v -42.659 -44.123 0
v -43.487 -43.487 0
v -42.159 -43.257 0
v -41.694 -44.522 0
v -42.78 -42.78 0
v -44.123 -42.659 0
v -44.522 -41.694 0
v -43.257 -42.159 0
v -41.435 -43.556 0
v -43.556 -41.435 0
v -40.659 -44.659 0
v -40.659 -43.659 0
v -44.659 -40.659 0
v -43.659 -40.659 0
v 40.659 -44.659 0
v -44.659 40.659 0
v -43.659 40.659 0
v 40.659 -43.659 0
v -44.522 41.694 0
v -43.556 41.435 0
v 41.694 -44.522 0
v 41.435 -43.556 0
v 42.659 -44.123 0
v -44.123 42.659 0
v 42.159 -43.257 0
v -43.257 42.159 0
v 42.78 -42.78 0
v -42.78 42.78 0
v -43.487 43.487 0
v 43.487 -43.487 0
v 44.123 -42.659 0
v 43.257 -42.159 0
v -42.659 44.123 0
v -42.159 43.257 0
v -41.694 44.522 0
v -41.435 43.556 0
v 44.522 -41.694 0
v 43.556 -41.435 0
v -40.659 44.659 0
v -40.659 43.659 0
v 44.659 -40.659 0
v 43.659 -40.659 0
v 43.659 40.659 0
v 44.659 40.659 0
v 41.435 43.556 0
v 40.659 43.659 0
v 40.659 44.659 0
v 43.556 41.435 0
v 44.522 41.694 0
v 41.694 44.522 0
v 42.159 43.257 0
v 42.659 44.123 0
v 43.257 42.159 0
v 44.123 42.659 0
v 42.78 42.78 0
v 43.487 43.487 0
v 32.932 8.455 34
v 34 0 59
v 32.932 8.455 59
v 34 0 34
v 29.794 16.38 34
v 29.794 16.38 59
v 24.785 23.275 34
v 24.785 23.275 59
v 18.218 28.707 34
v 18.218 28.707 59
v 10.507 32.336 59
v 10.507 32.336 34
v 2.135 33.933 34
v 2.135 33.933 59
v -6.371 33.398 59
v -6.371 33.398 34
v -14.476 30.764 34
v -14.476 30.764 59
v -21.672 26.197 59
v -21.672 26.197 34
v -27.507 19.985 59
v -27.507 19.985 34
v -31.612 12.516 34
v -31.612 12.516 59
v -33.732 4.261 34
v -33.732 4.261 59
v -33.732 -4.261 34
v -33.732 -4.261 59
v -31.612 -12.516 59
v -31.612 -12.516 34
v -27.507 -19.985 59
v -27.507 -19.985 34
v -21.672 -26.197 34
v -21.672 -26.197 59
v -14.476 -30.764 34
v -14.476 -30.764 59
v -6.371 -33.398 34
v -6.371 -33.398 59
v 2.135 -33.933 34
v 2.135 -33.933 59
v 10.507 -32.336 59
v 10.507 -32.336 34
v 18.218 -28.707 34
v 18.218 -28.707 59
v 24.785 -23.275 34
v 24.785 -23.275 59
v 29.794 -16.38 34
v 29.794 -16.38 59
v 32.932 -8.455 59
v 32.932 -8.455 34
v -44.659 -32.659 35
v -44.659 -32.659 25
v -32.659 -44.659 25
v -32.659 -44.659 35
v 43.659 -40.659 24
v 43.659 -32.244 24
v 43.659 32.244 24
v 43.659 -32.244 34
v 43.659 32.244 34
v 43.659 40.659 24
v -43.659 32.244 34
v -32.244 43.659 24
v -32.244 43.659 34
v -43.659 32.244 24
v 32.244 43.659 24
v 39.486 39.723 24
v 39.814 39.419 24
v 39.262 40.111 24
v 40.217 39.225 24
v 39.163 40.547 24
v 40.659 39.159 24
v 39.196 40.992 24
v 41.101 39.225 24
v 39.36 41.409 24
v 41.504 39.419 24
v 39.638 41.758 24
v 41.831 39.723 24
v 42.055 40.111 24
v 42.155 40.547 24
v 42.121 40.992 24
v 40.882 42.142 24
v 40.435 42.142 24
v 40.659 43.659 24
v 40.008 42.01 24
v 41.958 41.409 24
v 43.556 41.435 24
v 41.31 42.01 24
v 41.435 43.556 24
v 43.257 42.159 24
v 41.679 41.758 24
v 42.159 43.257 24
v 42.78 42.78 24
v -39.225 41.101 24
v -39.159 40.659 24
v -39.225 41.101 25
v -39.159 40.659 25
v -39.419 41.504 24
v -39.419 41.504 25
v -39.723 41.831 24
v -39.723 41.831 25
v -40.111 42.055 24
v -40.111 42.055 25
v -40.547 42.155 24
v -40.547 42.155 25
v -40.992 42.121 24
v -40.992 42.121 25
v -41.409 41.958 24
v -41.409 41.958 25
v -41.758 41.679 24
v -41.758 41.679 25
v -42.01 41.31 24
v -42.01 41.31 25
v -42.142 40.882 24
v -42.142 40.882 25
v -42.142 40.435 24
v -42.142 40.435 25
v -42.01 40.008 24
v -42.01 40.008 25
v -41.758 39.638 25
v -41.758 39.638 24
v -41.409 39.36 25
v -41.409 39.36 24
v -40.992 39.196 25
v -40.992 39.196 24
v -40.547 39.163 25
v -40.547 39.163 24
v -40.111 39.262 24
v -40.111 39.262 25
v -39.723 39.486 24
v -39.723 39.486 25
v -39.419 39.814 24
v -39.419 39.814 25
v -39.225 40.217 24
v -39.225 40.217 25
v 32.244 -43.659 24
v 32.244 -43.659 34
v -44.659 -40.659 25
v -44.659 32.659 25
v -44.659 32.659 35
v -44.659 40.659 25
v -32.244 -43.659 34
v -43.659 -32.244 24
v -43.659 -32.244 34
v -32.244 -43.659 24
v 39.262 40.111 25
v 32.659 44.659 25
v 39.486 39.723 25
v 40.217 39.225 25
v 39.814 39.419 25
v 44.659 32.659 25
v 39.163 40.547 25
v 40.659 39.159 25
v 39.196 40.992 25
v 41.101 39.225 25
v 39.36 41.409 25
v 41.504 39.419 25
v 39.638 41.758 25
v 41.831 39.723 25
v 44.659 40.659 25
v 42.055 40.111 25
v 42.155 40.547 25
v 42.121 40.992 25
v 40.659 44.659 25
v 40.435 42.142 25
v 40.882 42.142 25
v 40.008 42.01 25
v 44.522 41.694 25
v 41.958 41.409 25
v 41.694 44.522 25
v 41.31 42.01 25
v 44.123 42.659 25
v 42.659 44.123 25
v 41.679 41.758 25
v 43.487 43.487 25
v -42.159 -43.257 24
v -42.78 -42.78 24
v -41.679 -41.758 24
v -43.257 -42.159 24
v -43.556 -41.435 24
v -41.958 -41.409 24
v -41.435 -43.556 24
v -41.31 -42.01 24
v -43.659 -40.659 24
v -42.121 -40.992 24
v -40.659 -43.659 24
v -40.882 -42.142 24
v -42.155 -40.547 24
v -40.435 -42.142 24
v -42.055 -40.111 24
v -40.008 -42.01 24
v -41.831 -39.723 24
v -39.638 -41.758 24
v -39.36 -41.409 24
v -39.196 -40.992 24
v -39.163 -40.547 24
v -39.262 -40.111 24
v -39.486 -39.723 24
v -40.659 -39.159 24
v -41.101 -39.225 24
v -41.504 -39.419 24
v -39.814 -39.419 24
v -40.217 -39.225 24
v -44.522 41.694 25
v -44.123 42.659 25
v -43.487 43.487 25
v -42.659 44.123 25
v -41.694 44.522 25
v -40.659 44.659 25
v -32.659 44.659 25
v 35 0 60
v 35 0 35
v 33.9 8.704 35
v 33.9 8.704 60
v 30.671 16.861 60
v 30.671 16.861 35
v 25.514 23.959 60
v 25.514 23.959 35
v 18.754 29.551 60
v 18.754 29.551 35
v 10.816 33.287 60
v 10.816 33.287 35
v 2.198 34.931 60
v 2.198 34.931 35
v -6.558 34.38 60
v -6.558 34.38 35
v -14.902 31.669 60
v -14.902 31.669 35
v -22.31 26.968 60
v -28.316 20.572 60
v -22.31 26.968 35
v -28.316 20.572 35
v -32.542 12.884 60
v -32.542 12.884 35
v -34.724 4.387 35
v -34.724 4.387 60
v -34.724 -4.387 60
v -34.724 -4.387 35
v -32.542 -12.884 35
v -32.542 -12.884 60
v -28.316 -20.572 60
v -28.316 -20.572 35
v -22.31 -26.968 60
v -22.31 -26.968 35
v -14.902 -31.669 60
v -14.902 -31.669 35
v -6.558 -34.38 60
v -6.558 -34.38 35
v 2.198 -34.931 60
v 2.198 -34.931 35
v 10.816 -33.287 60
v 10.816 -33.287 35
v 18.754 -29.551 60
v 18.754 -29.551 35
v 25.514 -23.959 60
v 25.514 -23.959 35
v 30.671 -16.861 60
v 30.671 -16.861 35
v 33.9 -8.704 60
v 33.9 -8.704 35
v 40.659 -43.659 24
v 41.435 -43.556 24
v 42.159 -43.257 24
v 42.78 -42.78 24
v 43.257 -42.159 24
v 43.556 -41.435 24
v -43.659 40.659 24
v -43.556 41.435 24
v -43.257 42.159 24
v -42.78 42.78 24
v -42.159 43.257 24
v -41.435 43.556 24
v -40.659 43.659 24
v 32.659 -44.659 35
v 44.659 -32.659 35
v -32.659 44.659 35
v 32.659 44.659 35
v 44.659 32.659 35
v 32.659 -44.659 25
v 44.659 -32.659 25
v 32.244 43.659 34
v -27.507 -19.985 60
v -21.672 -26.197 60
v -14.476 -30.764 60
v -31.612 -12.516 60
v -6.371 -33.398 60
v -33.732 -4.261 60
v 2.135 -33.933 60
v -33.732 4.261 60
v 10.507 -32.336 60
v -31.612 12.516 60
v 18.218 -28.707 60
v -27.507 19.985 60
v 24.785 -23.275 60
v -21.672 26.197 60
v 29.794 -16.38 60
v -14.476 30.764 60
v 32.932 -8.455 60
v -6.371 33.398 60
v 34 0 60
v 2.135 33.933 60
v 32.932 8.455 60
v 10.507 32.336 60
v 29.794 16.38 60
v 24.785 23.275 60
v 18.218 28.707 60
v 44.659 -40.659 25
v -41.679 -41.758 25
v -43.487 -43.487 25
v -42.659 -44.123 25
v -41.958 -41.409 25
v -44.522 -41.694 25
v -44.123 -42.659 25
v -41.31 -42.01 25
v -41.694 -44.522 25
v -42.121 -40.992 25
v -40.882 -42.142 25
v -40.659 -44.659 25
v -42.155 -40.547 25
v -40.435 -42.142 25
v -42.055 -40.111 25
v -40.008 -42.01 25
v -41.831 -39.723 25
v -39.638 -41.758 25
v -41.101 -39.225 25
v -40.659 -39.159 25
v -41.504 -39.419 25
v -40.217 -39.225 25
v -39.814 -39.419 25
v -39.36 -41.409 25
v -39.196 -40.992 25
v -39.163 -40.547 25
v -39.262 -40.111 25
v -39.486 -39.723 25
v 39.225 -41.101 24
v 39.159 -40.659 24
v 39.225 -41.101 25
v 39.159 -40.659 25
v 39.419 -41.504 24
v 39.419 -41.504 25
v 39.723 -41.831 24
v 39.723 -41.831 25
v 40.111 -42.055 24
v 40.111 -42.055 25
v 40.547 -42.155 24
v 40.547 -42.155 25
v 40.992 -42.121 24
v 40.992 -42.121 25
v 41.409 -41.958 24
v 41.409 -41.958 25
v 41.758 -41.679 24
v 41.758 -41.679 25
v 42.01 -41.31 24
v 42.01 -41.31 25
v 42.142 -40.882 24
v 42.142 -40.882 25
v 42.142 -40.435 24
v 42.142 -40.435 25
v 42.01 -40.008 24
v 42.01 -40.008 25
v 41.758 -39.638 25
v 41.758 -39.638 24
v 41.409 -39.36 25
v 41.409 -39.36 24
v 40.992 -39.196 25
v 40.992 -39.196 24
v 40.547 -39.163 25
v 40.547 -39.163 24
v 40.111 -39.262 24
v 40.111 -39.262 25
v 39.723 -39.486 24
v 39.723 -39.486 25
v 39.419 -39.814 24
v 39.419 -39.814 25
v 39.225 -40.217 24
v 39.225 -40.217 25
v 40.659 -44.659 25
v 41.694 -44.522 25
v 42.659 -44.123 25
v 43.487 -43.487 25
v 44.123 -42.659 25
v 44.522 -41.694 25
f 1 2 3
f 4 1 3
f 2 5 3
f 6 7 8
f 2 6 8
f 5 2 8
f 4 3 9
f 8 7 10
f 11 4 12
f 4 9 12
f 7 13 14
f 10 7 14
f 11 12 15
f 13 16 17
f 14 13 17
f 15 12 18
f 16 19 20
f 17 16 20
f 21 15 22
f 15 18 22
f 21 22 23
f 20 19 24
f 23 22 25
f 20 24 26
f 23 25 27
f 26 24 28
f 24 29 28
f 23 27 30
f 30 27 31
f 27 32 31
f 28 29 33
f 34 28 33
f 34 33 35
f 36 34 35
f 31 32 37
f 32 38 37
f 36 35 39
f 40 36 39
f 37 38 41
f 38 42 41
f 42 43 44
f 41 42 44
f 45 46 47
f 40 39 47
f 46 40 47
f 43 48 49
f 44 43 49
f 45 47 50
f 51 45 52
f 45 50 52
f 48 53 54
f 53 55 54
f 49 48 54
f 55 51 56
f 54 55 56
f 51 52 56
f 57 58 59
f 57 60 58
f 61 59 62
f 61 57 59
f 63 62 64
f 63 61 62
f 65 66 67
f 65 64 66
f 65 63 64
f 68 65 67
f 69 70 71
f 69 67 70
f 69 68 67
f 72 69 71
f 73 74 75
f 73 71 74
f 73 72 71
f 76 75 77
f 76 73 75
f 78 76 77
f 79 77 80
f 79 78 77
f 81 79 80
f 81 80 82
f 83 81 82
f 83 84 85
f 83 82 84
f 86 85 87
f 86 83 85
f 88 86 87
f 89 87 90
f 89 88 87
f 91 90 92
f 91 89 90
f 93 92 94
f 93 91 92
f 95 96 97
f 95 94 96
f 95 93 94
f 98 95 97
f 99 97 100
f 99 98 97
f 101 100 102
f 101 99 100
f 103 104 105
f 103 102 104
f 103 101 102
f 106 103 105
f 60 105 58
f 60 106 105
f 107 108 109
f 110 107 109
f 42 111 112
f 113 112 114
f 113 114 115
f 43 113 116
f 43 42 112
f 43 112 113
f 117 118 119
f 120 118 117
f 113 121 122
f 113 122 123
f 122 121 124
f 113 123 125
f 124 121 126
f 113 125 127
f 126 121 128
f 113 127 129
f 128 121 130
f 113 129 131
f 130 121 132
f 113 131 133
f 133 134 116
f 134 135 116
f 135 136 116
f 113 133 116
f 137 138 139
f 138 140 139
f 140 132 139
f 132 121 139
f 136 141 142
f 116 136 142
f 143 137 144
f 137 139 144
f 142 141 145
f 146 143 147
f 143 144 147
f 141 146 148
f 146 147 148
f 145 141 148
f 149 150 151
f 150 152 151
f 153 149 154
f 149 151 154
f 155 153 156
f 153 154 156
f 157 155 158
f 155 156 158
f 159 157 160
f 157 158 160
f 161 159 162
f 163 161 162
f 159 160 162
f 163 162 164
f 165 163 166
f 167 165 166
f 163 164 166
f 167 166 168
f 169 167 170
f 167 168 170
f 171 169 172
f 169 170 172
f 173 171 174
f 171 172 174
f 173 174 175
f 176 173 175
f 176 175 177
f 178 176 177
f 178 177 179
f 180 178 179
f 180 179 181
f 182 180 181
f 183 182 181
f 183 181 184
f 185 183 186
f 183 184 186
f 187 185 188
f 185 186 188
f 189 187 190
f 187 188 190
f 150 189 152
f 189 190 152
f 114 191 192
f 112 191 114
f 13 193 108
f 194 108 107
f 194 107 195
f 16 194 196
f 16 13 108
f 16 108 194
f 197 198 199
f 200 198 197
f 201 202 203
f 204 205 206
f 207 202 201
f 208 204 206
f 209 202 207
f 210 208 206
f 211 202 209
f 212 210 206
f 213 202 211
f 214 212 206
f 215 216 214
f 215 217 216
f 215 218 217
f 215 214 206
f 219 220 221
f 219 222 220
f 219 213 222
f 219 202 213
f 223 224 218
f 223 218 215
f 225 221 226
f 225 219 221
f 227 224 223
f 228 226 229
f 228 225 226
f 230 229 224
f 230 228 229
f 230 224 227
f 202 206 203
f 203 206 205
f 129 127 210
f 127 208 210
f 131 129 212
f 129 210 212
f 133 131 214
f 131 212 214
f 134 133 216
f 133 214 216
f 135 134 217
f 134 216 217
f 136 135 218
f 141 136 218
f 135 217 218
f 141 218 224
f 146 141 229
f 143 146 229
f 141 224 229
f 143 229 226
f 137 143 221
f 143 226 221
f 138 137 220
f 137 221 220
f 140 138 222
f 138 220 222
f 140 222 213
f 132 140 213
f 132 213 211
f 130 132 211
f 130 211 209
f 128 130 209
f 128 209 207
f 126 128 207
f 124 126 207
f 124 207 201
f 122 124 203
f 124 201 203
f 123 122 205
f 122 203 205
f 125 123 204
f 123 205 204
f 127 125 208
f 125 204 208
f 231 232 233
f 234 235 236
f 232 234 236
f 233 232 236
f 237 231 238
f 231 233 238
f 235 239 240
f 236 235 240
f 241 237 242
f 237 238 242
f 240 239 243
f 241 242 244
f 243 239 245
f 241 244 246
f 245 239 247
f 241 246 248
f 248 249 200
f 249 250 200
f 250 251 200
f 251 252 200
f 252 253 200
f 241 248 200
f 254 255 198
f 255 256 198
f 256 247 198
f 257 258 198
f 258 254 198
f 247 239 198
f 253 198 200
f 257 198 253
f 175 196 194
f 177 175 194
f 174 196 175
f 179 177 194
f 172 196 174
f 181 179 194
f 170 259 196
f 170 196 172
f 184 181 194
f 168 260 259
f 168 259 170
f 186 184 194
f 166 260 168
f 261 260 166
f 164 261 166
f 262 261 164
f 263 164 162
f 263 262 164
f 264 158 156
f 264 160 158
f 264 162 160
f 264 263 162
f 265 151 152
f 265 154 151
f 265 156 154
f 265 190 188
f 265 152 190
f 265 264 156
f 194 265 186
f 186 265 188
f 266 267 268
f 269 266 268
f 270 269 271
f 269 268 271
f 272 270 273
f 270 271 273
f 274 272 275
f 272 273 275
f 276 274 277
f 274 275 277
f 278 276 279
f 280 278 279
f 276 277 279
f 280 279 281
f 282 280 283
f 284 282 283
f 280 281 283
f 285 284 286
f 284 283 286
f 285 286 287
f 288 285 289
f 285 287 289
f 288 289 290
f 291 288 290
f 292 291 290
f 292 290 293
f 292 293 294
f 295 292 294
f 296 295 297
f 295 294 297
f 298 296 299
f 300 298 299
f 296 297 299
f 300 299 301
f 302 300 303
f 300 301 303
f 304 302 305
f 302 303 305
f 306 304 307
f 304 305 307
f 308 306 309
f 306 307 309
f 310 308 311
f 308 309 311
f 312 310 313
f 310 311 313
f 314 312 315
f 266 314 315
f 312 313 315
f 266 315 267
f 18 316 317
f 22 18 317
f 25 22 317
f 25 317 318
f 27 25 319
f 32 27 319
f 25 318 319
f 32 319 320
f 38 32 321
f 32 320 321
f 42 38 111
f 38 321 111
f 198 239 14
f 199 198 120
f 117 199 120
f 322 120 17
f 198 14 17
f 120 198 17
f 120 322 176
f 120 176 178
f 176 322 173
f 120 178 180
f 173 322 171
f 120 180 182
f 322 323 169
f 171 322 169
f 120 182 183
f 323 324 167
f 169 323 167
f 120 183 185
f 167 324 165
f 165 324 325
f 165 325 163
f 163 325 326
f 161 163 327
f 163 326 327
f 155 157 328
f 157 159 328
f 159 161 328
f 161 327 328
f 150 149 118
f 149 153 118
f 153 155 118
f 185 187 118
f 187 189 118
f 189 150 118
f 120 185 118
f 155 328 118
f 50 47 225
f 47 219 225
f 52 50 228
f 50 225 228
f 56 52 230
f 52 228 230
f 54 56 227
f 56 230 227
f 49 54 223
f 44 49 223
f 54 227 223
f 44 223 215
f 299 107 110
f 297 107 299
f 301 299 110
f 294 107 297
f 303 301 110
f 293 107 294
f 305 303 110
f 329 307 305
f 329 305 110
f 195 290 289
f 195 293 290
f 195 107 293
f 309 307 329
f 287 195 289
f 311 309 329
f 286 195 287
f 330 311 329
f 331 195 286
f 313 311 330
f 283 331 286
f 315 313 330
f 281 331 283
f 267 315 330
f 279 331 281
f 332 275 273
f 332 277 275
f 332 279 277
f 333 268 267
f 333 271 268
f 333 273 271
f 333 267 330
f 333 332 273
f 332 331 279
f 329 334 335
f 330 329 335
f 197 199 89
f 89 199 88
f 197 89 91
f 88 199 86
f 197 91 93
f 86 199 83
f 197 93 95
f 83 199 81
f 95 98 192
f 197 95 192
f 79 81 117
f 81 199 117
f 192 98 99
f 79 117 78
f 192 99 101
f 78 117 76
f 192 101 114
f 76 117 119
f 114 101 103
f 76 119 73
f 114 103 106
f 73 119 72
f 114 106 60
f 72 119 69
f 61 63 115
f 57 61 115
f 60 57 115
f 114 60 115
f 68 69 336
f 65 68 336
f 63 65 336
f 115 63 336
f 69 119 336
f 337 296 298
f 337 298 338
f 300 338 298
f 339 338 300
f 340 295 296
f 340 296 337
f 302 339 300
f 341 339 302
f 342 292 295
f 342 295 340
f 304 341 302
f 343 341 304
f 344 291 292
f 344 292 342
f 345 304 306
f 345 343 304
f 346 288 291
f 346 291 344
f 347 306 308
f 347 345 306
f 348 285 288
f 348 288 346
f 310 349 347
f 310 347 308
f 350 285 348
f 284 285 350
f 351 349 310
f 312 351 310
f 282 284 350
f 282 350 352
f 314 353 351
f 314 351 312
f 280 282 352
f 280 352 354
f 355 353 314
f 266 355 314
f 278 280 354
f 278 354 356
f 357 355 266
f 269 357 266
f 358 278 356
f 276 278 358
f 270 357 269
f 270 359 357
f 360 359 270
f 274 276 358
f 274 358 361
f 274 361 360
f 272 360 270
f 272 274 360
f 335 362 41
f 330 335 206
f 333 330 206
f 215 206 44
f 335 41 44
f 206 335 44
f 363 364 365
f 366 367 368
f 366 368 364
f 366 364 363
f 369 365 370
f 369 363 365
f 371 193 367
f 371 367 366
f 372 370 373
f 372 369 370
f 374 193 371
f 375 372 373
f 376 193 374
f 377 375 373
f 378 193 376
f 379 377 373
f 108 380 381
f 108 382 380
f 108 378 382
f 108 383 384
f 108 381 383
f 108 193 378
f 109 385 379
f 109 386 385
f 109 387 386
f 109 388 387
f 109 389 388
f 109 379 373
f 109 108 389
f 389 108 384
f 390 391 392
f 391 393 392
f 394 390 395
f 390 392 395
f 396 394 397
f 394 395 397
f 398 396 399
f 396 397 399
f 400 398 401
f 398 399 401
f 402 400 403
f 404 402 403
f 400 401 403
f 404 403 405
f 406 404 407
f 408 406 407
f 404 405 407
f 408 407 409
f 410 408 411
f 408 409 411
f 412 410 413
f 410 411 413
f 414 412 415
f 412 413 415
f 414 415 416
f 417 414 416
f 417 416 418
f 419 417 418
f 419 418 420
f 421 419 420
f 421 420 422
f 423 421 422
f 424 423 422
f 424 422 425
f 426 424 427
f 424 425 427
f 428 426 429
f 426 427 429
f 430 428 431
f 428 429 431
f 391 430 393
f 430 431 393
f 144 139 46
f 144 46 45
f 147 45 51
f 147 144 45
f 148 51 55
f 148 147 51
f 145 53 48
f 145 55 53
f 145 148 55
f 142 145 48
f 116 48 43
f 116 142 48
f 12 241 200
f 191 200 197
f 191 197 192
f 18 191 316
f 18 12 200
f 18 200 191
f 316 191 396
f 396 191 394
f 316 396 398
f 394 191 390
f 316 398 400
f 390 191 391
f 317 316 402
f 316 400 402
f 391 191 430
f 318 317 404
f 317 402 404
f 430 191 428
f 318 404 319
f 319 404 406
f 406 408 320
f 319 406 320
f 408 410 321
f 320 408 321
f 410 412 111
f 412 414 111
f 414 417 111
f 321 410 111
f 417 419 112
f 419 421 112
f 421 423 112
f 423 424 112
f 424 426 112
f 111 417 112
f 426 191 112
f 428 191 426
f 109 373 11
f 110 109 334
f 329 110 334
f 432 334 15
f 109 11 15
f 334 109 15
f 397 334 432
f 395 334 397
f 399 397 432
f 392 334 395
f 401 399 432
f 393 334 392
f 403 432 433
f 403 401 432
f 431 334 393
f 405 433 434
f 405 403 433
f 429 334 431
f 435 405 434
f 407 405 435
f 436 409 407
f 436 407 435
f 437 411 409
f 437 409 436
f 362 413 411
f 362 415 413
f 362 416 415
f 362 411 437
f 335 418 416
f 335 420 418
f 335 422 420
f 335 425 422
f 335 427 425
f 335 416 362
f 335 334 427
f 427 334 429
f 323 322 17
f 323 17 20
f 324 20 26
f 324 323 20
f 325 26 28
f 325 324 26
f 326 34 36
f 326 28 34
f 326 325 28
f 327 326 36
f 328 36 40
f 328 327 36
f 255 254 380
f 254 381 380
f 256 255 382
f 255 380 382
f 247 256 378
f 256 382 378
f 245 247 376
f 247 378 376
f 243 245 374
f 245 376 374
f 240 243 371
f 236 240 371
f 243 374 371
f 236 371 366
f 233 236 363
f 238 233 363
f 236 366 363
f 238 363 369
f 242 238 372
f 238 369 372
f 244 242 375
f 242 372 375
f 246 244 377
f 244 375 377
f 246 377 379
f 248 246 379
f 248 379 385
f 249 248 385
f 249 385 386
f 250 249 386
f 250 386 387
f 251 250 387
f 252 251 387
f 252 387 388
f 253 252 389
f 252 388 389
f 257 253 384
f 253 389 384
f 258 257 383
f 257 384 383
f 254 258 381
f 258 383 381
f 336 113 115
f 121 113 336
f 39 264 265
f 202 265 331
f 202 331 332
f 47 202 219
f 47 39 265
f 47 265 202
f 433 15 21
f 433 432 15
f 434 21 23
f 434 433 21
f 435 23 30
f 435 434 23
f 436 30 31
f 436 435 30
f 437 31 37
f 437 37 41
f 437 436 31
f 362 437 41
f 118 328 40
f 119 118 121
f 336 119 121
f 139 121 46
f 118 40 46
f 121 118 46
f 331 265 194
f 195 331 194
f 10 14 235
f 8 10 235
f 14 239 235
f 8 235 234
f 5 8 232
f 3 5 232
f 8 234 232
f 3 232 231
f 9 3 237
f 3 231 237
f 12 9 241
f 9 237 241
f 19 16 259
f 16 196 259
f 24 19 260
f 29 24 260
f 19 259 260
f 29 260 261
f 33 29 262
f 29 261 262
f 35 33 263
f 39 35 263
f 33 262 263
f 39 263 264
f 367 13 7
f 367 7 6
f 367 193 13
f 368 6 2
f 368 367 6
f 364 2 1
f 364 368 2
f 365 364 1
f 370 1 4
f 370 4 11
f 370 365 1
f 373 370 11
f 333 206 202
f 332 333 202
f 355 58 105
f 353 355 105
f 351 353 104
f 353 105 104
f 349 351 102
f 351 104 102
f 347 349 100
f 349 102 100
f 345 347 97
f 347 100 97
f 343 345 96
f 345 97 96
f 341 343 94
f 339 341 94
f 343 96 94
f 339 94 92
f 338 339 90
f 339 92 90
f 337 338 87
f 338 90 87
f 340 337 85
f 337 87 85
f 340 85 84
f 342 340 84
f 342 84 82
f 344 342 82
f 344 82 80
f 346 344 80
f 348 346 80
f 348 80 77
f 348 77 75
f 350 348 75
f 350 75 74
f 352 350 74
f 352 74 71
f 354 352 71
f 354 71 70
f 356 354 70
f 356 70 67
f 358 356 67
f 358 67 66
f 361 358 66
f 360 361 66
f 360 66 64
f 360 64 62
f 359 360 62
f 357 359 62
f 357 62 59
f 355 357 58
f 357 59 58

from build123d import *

# Parameters (mm, degrees)
F0_W      = 89.3173888326
F0_H      = 89.3173888326
F1_DEPTH  = 25
F3_DEPTH  = 10
F4_R      = 35
F5_DEPTH  = 25
F6_R      = 4
F7_T      = -1
F8_DEPTH  = 41.7
F9_R      = 1.5
F10_DEPTH = 3.8
F12_COUNT = 4


with BuildPart() as f1:
    # F0 (on Top) → F1 (new body)
    with BuildSketch(Plane.XY):
        Rectangle(F0_W, F0_H)
    extrude(amount=F1_DEPTH)

    # F2 (on face) → F3 (join)
    with BuildSketch(Plane.XY.offset(25)):
        Polygon((32.6586944163, 44.6586944163), (-32.6586944163, 44.6586944163), (-44.6586944163, 32.6586944163), (-44.6586944163, -32.6586944163), (-32.6586944163, -44.6586944163), (32.6586944163, -44.6586944163), (44.6586944163, -32.6586944163), (44.6586944163, 32.6586944163), align=None)
    extrude(amount=F3_DEPTH)

    # F4 (on face) → F5 (join)
    with BuildSketch(Plane.XY.offset(35)):
        Circle(F4_R)
    extrude(amount=F5_DEPTH)

    # F6
    f6_edges = [f1.edges().sort_by_distance(p)[0] for p in [
        (44.658694, 44.658694, 12.5),
        (44.658694, -44.658694, 12.5),
        (-44.658694, -44.658694, 12.5),
        (-44.658694, 44.658694, 12.5),
    ]]
    fillet(f6_edges, radius=F6_R)

    # F7
    f7_openings = [f1.faces().sort_by_distance(p)[0] for p in [
        (0, 0, 0),
    ]]
    offset(amount=F7_T, openings=f7_openings, kind=Kind.INTERSECTION)

    # F8 (cut): a face of the model
    f8_faces = [f1.faces().sort_by_distance(p)[0] for p in [
        (0, 0, 59),
    ]]
    extrude(f8_faces, amount=-F8_DEPTH, mode=Mode.SUBTRACT)


with BuildPart() as f10:
    # F9 (on face) → F10 (new body, symmetric)
    with BuildSketch(Plane.XY.offset(25)):
        with Locations((-40.6586944163, 40.6586944163)):
            Circle(F9_R)
    extrude(amount=F10_DEPTH, both=True)


with BuildPart() as f12_1:
    # F12: instance of F10
    add(f10.part.rotate(Axis((0, 0, 19.2969664931), (0, 0, 1)), 1 * 360 / F12_COUNT))


with BuildPart() as f12_2:
    # F12: instance of F10
    add(f10.part.rotate(Axis((0, 0, 19.2969664931), (0, 0, 1)), 2 * 360 / F12_COUNT))


with BuildPart() as f12_3:
    # F12: instance of F10
    add(f10.part.rotate(Axis((0, 0, 19.2969664931), (0, 0, 1)), 3 * 360 / F12_COUNT))


with BuildPart() as f1_1:
    add(f1.part)

    # F13: cut F10, F12_3, F12_2, F12_1
    add(f10.part, mode=Mode.SUBTRACT)
    add(f12_3.part, mode=Mode.SUBTRACT)
    add(f12_2.part, mode=Mode.SUBTRACT)
    add(f12_1.part, mode=Mode.SUBTRACT)


solid = f1_1.part
